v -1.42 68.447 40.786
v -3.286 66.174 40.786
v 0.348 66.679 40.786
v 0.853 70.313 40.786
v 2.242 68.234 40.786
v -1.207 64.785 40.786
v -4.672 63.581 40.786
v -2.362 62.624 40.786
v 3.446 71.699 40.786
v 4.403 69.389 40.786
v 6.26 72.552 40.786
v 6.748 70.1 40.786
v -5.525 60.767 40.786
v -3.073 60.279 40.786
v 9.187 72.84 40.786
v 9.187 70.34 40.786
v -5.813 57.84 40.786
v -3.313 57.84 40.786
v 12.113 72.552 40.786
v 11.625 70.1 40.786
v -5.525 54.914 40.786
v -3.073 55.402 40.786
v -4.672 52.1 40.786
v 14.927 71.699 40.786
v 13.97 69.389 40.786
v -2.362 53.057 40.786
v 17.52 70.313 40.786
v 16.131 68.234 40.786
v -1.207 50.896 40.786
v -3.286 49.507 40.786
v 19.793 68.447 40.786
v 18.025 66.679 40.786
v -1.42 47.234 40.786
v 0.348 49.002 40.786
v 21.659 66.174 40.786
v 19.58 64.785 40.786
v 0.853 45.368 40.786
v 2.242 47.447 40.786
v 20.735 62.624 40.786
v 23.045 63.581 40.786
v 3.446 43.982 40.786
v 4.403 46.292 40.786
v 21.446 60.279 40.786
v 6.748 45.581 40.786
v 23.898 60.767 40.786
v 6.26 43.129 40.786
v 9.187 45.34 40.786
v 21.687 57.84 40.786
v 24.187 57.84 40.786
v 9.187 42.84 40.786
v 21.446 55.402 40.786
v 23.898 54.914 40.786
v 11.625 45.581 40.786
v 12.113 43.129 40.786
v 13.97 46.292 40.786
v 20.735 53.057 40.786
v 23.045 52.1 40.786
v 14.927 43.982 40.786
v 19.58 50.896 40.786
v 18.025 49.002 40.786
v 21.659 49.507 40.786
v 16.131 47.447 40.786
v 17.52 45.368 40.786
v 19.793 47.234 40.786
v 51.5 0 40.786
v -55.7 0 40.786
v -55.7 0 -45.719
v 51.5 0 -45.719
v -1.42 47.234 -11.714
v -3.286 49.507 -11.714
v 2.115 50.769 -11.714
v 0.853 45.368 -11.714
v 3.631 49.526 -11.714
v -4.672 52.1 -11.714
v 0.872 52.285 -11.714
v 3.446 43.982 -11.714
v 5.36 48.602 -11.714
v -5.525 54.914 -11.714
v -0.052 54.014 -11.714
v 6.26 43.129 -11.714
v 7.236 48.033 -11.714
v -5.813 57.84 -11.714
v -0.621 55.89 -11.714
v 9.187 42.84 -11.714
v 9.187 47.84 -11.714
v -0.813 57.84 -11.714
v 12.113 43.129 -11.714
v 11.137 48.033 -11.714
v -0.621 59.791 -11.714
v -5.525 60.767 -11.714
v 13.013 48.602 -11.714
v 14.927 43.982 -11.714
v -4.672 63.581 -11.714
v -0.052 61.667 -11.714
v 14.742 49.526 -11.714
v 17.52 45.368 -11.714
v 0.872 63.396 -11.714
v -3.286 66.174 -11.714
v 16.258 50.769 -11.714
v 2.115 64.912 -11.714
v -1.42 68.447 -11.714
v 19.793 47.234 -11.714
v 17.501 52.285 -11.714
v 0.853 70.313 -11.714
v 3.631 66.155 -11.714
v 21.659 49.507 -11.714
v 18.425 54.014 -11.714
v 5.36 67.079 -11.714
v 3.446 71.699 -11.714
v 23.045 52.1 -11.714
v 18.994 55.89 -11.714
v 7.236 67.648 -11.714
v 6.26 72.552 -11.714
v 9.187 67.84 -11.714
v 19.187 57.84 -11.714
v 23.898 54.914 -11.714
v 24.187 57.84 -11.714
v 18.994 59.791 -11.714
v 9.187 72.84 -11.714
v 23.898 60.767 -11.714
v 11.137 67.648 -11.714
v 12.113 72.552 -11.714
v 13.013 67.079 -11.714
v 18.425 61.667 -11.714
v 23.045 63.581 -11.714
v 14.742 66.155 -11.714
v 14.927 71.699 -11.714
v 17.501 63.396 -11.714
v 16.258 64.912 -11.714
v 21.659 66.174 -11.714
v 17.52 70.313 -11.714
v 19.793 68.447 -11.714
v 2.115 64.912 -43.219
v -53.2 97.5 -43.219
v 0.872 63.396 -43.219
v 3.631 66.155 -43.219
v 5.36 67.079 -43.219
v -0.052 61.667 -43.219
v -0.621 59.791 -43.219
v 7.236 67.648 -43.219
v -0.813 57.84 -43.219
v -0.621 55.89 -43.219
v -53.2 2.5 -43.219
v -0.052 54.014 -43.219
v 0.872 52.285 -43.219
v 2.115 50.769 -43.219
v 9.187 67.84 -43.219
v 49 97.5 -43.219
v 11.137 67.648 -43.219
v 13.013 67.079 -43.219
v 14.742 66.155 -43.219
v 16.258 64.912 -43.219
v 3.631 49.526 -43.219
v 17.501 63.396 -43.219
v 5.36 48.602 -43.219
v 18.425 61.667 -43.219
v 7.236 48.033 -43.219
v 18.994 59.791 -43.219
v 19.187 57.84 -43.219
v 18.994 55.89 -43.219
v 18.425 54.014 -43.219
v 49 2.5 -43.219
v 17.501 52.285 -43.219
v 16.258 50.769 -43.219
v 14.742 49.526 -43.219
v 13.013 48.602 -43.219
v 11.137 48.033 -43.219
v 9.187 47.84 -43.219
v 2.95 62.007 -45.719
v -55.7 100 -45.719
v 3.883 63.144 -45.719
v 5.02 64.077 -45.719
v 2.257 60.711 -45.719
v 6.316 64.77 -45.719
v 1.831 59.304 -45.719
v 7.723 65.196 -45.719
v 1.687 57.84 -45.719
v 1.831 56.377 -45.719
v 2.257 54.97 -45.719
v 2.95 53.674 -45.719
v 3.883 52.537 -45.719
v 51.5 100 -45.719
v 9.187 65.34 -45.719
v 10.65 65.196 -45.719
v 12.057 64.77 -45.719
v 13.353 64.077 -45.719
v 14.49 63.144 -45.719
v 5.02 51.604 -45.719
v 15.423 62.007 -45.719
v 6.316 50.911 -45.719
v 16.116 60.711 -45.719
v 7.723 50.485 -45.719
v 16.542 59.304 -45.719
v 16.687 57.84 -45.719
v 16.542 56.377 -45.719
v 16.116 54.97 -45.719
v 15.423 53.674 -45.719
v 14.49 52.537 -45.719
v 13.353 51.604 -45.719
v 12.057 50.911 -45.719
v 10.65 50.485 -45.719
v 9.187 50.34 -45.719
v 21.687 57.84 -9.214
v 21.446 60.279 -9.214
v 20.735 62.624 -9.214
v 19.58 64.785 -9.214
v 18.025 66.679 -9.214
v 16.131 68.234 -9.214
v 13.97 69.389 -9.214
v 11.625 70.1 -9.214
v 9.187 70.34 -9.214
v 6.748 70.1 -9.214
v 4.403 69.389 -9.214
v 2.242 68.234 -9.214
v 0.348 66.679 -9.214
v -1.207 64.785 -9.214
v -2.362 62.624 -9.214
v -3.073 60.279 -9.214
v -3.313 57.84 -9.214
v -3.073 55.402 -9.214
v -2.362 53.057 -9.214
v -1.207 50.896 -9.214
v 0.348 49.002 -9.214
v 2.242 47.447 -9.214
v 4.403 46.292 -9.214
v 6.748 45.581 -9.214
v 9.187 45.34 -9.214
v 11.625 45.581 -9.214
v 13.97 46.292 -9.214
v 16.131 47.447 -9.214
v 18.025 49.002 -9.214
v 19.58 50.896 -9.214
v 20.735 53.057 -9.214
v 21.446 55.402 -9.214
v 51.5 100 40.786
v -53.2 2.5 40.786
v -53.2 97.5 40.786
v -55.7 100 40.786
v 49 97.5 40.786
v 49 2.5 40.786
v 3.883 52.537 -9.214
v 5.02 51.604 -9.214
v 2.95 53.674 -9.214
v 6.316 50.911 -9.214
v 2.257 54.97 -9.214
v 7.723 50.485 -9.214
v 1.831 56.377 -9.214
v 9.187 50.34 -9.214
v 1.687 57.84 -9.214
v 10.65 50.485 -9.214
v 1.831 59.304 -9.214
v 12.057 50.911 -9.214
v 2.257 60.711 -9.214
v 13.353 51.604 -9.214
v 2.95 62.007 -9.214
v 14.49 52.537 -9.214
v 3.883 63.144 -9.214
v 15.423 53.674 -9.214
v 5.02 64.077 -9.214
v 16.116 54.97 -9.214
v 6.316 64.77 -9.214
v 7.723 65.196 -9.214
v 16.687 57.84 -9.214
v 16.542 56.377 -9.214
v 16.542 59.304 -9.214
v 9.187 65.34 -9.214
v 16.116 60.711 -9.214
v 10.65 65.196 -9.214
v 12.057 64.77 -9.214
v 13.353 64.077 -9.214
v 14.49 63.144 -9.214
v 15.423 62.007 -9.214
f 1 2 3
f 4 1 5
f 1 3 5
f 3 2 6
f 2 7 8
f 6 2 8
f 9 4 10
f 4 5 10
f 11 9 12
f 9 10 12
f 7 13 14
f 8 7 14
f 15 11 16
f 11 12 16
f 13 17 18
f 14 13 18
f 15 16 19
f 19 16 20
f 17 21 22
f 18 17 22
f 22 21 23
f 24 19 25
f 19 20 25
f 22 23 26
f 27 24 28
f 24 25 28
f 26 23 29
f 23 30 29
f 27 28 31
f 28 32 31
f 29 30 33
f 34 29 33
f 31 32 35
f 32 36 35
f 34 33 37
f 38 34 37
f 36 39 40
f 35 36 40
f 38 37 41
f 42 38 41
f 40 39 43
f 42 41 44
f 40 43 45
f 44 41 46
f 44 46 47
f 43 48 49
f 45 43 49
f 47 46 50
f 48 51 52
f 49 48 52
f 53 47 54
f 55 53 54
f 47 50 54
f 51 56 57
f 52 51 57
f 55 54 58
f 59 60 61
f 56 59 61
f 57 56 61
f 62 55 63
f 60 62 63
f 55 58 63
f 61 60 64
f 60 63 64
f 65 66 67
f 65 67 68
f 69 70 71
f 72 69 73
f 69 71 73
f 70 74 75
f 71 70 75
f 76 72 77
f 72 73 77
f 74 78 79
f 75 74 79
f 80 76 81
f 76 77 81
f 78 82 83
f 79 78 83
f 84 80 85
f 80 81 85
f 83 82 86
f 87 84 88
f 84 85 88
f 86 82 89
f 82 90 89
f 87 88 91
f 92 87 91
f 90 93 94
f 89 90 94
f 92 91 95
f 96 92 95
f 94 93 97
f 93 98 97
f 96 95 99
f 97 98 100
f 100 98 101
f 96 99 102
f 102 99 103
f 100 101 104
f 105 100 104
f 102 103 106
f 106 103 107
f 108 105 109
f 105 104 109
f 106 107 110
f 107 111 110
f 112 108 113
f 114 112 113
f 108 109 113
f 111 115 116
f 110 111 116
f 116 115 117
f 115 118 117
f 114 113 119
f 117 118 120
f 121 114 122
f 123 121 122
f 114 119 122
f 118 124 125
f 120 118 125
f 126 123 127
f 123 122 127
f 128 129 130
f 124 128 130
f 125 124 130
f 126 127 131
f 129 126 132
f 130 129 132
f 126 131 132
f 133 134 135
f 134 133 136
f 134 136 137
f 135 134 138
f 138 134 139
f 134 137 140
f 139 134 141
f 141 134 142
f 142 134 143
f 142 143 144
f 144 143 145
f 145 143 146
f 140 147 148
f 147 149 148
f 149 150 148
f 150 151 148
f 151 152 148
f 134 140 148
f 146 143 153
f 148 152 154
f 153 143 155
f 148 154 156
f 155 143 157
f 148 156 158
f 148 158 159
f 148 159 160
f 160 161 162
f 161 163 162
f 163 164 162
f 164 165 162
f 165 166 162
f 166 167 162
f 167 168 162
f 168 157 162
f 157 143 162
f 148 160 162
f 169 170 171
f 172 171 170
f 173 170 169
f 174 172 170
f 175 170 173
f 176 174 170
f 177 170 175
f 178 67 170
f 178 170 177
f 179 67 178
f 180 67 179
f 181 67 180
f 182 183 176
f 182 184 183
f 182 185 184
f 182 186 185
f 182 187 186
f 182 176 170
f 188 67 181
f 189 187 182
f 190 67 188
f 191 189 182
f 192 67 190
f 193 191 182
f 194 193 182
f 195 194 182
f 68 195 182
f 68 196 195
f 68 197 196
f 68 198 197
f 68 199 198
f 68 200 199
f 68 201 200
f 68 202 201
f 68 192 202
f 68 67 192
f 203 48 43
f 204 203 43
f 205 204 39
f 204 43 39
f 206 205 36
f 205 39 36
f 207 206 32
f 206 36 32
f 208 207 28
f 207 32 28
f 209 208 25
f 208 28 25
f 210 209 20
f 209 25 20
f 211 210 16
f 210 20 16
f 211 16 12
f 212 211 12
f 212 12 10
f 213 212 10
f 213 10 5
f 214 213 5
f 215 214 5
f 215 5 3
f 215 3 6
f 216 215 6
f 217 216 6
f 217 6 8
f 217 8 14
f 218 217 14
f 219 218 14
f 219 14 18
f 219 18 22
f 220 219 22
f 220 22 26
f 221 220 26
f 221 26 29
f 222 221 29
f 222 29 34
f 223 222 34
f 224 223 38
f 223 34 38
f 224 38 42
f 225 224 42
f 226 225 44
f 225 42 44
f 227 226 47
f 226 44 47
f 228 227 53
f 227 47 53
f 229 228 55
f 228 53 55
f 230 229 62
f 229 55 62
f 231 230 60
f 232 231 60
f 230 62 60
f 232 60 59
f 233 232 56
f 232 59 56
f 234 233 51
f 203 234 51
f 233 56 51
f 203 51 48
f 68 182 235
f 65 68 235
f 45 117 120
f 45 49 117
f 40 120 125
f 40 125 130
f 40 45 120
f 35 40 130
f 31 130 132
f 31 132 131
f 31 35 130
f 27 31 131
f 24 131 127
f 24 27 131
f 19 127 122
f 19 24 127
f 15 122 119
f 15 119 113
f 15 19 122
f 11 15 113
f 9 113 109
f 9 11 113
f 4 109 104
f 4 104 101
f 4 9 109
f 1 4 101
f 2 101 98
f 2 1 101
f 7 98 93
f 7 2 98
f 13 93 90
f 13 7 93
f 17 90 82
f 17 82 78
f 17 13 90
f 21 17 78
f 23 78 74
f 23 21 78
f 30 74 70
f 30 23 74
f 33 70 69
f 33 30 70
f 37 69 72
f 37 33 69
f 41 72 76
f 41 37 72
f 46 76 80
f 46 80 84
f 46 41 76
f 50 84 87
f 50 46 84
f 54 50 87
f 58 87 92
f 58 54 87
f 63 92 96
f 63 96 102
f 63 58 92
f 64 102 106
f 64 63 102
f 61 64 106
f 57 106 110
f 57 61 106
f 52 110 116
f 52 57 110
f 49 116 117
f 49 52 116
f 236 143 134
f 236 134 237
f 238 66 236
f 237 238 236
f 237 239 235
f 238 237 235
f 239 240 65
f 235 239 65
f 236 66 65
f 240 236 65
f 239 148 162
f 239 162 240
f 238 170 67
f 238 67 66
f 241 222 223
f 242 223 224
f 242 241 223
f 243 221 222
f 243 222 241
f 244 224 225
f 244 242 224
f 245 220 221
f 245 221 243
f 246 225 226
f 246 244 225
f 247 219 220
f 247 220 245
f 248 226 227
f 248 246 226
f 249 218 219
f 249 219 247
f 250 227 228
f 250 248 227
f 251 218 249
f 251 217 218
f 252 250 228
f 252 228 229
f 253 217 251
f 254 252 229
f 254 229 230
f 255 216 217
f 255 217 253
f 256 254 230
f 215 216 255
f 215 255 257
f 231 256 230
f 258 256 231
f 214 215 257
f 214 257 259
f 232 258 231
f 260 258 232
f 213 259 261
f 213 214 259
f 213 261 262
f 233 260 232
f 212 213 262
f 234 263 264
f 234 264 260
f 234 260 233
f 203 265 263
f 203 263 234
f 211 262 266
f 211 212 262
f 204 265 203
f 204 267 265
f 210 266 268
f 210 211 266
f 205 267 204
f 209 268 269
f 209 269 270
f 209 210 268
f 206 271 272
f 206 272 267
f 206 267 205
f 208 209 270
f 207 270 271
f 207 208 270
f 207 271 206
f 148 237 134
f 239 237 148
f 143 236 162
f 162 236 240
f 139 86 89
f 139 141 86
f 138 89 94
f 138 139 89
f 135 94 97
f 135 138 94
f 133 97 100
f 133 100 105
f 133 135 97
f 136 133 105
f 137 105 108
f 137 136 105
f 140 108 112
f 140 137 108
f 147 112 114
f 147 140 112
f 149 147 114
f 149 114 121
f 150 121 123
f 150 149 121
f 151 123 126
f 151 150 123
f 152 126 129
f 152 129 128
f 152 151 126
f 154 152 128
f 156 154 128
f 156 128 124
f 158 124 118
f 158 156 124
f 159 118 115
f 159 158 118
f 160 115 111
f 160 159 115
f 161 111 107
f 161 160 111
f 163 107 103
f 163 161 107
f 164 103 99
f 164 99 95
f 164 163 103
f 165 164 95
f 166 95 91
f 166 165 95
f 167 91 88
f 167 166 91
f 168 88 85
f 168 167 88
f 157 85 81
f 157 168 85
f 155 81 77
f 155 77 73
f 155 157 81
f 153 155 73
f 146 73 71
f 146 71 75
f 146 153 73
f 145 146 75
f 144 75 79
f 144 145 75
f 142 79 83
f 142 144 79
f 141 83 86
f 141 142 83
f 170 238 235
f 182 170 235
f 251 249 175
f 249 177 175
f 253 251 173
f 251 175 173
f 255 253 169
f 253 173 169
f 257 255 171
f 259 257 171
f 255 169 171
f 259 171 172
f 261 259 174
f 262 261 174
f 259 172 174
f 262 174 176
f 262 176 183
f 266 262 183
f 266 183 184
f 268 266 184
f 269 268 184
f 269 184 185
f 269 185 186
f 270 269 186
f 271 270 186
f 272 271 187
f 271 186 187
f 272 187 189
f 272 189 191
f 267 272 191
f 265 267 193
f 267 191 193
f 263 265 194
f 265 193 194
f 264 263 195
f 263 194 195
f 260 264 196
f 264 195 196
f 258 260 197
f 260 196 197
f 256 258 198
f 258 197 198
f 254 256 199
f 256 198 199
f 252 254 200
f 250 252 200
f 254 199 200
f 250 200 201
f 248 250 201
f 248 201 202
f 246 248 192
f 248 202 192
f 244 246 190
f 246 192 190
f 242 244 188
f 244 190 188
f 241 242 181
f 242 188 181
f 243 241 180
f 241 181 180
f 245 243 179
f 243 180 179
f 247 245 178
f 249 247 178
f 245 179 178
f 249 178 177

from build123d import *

# Parameters (mm, degrees)
F0_W           = 107.2001978755
F0_H           = 86.5053012967
F1_DEPTH       = 100
F3_D           = 15
F3_CBORE_D     = 25
F3_CBORE_DEPTH = 50
F4_T           = -2.5


with BuildPart() as f1:
    # F0 (on Front) → F1 (new body)
    with BuildSketch(Plane.XZ):
        with Locations((-2.1000653505, -2.4665594101)):
            Rectangle(F0_W, F0_H)
    extrude(amount=-F1_DEPTH)

    # F3 (through all)
    with Locations(Plane.XY.offset(40.7860912383)):
        with Locations((9.1865165159, 57.8404814005)):
            CounterBoreHole(F3_D / 2, F3_CBORE_D / 2, F3_CBORE_DEPTH)

    # F4
    f4_openings = [f1.faces().sort_by_distance(p)[0] for p in [
        (-2.641683, 49.623753, 40.786091),
    ]]
    offset(amount=F4_T, openings=f4_openings, kind=Kind.INTERSECTION)


solid = f1.part
